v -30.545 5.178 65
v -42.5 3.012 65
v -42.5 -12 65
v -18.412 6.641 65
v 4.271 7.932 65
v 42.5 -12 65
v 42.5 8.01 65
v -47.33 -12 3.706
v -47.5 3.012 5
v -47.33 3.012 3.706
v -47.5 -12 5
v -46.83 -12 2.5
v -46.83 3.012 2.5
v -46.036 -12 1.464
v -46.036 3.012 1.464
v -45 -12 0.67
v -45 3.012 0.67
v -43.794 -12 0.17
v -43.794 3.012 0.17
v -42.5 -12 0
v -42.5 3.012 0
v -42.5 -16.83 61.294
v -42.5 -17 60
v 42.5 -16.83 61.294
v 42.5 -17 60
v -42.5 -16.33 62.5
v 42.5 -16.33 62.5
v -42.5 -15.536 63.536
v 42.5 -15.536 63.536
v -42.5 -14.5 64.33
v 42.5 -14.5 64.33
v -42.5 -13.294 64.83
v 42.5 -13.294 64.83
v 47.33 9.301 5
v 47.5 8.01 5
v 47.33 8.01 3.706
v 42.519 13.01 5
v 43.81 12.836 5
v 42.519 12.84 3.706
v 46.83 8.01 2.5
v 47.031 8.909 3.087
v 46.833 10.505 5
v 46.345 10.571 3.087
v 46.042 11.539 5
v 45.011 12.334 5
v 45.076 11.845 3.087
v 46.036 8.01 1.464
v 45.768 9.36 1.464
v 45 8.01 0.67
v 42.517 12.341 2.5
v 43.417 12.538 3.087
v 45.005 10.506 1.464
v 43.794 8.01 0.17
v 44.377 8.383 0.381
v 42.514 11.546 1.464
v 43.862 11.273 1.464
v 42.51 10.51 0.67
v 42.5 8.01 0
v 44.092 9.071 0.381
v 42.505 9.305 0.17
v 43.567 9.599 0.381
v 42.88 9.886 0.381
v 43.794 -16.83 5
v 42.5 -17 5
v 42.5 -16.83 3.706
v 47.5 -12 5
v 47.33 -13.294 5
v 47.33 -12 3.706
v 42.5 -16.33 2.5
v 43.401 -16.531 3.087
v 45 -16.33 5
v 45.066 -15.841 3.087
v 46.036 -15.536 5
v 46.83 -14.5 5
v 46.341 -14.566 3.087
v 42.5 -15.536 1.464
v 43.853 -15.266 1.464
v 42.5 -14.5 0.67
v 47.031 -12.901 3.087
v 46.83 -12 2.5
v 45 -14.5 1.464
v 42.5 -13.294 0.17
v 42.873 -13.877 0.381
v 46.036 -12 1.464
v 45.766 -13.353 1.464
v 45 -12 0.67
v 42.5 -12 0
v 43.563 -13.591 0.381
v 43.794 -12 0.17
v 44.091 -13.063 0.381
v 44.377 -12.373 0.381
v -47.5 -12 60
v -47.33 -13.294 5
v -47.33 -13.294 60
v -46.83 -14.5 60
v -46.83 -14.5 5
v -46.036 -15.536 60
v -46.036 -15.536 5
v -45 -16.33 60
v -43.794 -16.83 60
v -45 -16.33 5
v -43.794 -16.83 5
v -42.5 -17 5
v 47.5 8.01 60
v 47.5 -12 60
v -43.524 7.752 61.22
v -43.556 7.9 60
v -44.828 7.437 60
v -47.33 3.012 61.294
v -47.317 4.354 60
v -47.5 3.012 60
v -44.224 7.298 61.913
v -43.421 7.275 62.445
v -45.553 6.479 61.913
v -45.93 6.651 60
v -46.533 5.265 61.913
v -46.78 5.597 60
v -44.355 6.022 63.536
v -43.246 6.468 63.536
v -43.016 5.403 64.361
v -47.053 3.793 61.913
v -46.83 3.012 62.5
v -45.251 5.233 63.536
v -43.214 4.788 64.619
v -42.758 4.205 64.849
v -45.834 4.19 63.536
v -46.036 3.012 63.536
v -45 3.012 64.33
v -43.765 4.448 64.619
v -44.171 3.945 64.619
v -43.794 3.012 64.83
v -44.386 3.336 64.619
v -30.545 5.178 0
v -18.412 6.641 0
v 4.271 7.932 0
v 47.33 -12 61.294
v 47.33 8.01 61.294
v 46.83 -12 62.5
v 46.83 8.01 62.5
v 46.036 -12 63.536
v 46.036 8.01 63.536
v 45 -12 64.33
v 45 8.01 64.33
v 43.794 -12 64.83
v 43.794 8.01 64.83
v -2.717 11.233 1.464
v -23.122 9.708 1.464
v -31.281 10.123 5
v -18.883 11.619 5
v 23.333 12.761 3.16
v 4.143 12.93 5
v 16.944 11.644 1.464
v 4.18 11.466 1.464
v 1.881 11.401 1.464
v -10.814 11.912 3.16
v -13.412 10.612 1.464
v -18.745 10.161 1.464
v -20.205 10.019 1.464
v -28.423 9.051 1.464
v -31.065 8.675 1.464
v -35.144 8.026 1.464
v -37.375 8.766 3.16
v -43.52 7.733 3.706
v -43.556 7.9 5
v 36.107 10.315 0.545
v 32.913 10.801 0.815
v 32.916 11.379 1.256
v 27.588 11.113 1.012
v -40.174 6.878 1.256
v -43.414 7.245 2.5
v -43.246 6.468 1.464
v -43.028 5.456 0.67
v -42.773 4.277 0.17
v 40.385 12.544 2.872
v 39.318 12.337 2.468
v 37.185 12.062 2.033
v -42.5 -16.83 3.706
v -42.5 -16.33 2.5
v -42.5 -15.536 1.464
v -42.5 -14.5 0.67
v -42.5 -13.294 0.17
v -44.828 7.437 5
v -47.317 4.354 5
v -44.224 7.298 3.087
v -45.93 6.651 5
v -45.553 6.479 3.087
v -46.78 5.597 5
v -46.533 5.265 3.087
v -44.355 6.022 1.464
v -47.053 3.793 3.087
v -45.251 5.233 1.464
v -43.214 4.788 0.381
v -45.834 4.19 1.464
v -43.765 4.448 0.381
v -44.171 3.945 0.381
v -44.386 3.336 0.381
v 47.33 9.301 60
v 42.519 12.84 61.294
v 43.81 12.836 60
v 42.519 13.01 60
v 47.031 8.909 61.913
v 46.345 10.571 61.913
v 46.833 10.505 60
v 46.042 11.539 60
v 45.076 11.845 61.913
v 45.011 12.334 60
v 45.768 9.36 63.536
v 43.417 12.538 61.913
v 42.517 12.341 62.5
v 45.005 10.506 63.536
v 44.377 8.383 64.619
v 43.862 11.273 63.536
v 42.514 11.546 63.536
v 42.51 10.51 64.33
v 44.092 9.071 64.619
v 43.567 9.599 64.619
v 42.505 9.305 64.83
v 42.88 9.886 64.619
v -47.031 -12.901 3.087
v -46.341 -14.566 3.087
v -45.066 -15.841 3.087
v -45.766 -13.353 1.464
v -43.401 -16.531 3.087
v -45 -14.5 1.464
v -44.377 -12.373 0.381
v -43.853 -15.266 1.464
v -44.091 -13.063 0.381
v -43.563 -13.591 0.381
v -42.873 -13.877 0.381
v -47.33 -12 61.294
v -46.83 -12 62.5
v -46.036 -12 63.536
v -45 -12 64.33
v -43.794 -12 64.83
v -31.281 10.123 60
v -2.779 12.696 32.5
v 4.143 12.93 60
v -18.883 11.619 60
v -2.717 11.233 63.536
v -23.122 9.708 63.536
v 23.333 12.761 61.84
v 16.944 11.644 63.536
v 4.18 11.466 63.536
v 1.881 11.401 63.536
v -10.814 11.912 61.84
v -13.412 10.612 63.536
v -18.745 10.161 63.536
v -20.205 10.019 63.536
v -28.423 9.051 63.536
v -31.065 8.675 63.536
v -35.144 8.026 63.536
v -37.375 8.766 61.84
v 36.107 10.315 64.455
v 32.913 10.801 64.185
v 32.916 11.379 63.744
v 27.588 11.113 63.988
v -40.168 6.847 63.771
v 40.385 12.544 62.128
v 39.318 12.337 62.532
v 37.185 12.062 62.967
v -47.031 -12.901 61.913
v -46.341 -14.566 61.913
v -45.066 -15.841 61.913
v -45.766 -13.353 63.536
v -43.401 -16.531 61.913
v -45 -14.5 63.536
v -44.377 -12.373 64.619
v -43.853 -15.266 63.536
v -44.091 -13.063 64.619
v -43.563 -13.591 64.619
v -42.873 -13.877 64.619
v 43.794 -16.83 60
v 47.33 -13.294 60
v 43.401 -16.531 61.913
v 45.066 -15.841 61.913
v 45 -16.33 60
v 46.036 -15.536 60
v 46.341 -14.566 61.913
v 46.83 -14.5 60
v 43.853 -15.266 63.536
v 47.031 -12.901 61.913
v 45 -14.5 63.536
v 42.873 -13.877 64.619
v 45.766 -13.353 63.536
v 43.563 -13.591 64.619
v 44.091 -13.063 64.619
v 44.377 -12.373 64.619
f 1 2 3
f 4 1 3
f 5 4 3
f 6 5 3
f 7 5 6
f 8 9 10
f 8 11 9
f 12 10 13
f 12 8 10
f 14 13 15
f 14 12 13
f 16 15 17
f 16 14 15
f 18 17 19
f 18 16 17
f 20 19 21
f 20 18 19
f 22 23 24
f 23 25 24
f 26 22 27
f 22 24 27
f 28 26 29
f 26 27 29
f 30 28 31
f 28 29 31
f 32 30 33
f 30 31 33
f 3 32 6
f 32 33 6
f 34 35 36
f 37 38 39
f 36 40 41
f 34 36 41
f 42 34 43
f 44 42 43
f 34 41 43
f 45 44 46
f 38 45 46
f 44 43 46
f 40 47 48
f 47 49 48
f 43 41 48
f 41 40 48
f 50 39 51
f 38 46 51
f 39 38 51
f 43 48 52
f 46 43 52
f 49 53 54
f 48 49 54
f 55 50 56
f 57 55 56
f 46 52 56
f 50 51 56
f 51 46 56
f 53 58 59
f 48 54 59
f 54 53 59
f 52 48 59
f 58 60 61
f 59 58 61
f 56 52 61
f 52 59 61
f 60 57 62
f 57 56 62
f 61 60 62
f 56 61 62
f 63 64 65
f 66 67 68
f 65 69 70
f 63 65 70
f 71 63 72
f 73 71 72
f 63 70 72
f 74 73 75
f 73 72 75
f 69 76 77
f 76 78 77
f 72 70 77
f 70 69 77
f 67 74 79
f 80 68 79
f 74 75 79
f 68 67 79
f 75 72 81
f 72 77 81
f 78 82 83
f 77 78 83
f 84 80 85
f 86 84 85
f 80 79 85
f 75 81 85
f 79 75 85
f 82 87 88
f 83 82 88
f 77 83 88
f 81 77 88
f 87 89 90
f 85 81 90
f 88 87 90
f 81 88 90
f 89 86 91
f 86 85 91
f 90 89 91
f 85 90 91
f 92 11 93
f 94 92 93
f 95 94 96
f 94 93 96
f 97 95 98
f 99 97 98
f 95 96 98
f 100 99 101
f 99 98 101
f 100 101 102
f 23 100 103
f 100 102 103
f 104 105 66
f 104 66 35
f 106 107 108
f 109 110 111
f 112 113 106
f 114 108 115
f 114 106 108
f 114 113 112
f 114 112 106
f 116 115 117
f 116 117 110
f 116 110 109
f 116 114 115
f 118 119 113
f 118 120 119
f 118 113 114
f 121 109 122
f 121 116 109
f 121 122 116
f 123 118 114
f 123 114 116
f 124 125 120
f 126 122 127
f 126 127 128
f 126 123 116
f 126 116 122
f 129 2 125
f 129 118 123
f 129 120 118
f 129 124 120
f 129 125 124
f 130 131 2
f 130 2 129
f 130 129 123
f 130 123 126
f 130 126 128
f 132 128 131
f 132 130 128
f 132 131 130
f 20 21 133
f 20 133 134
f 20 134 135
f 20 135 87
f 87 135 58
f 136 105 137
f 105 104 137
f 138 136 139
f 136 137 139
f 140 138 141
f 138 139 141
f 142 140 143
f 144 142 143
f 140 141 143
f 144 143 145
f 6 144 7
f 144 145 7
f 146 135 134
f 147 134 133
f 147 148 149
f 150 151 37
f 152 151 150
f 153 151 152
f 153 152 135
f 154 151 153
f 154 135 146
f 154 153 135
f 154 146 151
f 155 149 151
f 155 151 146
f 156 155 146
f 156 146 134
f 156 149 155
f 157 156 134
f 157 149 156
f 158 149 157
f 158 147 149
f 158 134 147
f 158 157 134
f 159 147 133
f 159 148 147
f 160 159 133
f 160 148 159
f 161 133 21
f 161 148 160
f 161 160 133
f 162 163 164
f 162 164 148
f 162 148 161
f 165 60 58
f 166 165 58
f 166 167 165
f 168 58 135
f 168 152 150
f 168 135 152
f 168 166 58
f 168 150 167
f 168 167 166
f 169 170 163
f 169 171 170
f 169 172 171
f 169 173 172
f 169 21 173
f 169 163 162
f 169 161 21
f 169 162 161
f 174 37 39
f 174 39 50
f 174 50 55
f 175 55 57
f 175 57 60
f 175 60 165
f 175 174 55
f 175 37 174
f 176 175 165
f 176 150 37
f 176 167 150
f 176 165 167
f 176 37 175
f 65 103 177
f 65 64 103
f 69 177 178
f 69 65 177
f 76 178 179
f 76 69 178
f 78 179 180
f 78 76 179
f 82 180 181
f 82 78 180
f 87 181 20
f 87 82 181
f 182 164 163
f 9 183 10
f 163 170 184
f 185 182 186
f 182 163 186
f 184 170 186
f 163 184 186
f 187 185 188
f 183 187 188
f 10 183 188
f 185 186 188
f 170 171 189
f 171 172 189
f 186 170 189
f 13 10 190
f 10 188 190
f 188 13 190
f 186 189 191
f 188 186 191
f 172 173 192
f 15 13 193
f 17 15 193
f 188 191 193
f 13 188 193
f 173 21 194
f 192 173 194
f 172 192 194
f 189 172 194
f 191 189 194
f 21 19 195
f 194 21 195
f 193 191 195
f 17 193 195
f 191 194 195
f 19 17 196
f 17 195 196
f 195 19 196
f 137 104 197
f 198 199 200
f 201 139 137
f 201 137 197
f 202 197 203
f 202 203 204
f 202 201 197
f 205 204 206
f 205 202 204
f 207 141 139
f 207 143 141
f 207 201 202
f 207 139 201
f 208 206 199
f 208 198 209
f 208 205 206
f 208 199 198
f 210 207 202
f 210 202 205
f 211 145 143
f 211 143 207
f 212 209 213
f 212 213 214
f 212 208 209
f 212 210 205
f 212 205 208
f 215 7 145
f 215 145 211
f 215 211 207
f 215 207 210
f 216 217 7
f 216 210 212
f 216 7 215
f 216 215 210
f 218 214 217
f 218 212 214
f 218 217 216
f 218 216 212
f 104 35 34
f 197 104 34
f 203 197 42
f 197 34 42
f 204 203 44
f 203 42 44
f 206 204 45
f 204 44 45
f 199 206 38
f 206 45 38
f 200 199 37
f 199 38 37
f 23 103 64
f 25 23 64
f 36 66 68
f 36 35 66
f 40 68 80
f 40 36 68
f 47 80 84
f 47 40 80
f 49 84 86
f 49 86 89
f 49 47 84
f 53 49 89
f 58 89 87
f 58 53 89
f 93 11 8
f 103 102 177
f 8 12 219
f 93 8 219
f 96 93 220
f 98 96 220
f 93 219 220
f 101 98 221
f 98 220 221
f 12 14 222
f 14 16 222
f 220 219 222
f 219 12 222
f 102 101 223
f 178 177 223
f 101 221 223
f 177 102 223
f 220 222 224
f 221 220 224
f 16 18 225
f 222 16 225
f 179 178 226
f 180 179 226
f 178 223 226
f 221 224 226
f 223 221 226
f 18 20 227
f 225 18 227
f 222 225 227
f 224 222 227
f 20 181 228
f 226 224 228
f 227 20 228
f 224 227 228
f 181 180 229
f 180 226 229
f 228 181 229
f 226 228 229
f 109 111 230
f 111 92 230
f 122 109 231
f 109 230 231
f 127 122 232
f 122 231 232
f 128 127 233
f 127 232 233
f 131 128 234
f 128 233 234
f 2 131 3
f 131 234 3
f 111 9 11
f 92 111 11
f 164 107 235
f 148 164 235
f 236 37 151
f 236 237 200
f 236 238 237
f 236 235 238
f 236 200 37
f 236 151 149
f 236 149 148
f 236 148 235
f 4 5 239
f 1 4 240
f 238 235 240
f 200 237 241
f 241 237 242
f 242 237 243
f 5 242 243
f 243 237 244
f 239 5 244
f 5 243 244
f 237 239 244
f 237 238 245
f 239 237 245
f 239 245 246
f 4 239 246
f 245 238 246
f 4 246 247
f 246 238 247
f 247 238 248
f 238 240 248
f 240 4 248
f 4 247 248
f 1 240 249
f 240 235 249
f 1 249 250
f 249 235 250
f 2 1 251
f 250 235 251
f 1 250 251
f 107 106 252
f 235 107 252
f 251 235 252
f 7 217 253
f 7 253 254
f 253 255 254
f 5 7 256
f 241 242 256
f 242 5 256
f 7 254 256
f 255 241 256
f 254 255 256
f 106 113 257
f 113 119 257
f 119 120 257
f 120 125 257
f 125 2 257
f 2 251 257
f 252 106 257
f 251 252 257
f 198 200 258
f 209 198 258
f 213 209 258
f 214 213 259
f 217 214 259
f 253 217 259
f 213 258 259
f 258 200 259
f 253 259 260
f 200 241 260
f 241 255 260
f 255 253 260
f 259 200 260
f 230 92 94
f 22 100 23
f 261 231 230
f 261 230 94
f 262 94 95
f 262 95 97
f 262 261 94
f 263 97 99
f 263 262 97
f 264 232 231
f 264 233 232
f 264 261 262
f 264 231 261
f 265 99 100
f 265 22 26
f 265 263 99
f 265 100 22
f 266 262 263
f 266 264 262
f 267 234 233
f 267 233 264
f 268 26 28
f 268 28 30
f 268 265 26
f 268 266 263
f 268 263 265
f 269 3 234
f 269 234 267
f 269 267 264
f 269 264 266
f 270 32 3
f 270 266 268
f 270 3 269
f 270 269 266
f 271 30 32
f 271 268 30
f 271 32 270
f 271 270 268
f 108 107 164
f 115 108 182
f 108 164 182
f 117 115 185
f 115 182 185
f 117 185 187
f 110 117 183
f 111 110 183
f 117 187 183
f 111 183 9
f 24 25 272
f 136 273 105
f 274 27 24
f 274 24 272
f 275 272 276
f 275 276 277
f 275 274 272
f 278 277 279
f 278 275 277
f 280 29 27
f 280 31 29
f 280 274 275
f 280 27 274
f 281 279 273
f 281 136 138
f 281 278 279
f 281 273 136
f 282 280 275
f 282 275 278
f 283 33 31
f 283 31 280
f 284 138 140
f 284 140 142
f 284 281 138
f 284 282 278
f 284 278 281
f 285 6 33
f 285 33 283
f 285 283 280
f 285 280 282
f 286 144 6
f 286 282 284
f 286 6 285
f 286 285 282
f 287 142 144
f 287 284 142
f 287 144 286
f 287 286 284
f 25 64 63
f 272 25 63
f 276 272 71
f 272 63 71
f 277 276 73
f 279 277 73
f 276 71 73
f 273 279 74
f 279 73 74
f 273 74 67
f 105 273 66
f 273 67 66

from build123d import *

# Parameters (mm, degrees)
BOSS_EXTRUDE1_DEPTH = 65
FILLET1_R           = 5


with BuildPart() as part:
    # Sketch1 → Boss-Extrude1 (new body)
    with BuildSketch(Plane.XY):
        with BuildLine():
            Line((-42.5, -17), (42.5, -17))
            ThreePointArc((42.5, -17), (46.035533906, -15.535533906), (47.5, -12))
            Line((47.5, -12), (47.5, 8.010433268))
            ThreePointArc((47.5, 8.010433268), (46.0423765, 11.539111311), (42.519372507, 13.010395738))
            add(Edge.make_bspline(
                [(-43.555532841, 7.899733163), (-30.176694997, 10.789213784), (-1.352486938, 13.578958487), (27.425027944, 13.068879237), (42.519372507, 13.010395738)],
                knots=[0.042375719, 0.042375719, 0.042375719, 0.042375719, 0.472818051, 0.947722656, 0.947722656, 0.947722656, 0.947722656], degree=3))
            ThreePointArc((-43.555532841, 7.899733163), (-46.390865213, 6.152667561), (-47.5, 3.012417906))
            Line((-47.5, 3.012417906), (-47.5, -12))
            ThreePointArc((-47.5, -12), (-46.035533906, -15.535533906), (-42.5, -17))
        make_face()
    extrude(amount=BOSS_EXTRUDE1_DEPTH)

    # Fillet1
    fillet1_edges = [part.edges().sort_by_distance(p)[0] for p in [
        (-47.5, -4.493791047, 65),
        (-46.390865213, 6.152667561, 0),
        (-0.682392831, 12.779176888, 0),
        (-46.035533906, -15.535533906, 65),
        (0, -17, 65),
        (46.035533906, -15.535533906, 65),
        (47.5, -1.994783366, 65),
        (46.0423765, 11.539111311, 65),
        (-0.682392831, 12.779176888, 65),
        (-46.390865213, 6.152667561, 65),
        (46.0423765, 11.539111311, 0),
        (47.5, -1.994783366, 0),
        (46.035533906, -15.535533906, 0),
        (0, -17, 0),
        (-46.035533906, -15.535533906, 0),
        (-47.5, -4.493791047, 0),
    ]]
    fillet(fillet1_edges, radius=FILLET1_R)


solid = part.part
